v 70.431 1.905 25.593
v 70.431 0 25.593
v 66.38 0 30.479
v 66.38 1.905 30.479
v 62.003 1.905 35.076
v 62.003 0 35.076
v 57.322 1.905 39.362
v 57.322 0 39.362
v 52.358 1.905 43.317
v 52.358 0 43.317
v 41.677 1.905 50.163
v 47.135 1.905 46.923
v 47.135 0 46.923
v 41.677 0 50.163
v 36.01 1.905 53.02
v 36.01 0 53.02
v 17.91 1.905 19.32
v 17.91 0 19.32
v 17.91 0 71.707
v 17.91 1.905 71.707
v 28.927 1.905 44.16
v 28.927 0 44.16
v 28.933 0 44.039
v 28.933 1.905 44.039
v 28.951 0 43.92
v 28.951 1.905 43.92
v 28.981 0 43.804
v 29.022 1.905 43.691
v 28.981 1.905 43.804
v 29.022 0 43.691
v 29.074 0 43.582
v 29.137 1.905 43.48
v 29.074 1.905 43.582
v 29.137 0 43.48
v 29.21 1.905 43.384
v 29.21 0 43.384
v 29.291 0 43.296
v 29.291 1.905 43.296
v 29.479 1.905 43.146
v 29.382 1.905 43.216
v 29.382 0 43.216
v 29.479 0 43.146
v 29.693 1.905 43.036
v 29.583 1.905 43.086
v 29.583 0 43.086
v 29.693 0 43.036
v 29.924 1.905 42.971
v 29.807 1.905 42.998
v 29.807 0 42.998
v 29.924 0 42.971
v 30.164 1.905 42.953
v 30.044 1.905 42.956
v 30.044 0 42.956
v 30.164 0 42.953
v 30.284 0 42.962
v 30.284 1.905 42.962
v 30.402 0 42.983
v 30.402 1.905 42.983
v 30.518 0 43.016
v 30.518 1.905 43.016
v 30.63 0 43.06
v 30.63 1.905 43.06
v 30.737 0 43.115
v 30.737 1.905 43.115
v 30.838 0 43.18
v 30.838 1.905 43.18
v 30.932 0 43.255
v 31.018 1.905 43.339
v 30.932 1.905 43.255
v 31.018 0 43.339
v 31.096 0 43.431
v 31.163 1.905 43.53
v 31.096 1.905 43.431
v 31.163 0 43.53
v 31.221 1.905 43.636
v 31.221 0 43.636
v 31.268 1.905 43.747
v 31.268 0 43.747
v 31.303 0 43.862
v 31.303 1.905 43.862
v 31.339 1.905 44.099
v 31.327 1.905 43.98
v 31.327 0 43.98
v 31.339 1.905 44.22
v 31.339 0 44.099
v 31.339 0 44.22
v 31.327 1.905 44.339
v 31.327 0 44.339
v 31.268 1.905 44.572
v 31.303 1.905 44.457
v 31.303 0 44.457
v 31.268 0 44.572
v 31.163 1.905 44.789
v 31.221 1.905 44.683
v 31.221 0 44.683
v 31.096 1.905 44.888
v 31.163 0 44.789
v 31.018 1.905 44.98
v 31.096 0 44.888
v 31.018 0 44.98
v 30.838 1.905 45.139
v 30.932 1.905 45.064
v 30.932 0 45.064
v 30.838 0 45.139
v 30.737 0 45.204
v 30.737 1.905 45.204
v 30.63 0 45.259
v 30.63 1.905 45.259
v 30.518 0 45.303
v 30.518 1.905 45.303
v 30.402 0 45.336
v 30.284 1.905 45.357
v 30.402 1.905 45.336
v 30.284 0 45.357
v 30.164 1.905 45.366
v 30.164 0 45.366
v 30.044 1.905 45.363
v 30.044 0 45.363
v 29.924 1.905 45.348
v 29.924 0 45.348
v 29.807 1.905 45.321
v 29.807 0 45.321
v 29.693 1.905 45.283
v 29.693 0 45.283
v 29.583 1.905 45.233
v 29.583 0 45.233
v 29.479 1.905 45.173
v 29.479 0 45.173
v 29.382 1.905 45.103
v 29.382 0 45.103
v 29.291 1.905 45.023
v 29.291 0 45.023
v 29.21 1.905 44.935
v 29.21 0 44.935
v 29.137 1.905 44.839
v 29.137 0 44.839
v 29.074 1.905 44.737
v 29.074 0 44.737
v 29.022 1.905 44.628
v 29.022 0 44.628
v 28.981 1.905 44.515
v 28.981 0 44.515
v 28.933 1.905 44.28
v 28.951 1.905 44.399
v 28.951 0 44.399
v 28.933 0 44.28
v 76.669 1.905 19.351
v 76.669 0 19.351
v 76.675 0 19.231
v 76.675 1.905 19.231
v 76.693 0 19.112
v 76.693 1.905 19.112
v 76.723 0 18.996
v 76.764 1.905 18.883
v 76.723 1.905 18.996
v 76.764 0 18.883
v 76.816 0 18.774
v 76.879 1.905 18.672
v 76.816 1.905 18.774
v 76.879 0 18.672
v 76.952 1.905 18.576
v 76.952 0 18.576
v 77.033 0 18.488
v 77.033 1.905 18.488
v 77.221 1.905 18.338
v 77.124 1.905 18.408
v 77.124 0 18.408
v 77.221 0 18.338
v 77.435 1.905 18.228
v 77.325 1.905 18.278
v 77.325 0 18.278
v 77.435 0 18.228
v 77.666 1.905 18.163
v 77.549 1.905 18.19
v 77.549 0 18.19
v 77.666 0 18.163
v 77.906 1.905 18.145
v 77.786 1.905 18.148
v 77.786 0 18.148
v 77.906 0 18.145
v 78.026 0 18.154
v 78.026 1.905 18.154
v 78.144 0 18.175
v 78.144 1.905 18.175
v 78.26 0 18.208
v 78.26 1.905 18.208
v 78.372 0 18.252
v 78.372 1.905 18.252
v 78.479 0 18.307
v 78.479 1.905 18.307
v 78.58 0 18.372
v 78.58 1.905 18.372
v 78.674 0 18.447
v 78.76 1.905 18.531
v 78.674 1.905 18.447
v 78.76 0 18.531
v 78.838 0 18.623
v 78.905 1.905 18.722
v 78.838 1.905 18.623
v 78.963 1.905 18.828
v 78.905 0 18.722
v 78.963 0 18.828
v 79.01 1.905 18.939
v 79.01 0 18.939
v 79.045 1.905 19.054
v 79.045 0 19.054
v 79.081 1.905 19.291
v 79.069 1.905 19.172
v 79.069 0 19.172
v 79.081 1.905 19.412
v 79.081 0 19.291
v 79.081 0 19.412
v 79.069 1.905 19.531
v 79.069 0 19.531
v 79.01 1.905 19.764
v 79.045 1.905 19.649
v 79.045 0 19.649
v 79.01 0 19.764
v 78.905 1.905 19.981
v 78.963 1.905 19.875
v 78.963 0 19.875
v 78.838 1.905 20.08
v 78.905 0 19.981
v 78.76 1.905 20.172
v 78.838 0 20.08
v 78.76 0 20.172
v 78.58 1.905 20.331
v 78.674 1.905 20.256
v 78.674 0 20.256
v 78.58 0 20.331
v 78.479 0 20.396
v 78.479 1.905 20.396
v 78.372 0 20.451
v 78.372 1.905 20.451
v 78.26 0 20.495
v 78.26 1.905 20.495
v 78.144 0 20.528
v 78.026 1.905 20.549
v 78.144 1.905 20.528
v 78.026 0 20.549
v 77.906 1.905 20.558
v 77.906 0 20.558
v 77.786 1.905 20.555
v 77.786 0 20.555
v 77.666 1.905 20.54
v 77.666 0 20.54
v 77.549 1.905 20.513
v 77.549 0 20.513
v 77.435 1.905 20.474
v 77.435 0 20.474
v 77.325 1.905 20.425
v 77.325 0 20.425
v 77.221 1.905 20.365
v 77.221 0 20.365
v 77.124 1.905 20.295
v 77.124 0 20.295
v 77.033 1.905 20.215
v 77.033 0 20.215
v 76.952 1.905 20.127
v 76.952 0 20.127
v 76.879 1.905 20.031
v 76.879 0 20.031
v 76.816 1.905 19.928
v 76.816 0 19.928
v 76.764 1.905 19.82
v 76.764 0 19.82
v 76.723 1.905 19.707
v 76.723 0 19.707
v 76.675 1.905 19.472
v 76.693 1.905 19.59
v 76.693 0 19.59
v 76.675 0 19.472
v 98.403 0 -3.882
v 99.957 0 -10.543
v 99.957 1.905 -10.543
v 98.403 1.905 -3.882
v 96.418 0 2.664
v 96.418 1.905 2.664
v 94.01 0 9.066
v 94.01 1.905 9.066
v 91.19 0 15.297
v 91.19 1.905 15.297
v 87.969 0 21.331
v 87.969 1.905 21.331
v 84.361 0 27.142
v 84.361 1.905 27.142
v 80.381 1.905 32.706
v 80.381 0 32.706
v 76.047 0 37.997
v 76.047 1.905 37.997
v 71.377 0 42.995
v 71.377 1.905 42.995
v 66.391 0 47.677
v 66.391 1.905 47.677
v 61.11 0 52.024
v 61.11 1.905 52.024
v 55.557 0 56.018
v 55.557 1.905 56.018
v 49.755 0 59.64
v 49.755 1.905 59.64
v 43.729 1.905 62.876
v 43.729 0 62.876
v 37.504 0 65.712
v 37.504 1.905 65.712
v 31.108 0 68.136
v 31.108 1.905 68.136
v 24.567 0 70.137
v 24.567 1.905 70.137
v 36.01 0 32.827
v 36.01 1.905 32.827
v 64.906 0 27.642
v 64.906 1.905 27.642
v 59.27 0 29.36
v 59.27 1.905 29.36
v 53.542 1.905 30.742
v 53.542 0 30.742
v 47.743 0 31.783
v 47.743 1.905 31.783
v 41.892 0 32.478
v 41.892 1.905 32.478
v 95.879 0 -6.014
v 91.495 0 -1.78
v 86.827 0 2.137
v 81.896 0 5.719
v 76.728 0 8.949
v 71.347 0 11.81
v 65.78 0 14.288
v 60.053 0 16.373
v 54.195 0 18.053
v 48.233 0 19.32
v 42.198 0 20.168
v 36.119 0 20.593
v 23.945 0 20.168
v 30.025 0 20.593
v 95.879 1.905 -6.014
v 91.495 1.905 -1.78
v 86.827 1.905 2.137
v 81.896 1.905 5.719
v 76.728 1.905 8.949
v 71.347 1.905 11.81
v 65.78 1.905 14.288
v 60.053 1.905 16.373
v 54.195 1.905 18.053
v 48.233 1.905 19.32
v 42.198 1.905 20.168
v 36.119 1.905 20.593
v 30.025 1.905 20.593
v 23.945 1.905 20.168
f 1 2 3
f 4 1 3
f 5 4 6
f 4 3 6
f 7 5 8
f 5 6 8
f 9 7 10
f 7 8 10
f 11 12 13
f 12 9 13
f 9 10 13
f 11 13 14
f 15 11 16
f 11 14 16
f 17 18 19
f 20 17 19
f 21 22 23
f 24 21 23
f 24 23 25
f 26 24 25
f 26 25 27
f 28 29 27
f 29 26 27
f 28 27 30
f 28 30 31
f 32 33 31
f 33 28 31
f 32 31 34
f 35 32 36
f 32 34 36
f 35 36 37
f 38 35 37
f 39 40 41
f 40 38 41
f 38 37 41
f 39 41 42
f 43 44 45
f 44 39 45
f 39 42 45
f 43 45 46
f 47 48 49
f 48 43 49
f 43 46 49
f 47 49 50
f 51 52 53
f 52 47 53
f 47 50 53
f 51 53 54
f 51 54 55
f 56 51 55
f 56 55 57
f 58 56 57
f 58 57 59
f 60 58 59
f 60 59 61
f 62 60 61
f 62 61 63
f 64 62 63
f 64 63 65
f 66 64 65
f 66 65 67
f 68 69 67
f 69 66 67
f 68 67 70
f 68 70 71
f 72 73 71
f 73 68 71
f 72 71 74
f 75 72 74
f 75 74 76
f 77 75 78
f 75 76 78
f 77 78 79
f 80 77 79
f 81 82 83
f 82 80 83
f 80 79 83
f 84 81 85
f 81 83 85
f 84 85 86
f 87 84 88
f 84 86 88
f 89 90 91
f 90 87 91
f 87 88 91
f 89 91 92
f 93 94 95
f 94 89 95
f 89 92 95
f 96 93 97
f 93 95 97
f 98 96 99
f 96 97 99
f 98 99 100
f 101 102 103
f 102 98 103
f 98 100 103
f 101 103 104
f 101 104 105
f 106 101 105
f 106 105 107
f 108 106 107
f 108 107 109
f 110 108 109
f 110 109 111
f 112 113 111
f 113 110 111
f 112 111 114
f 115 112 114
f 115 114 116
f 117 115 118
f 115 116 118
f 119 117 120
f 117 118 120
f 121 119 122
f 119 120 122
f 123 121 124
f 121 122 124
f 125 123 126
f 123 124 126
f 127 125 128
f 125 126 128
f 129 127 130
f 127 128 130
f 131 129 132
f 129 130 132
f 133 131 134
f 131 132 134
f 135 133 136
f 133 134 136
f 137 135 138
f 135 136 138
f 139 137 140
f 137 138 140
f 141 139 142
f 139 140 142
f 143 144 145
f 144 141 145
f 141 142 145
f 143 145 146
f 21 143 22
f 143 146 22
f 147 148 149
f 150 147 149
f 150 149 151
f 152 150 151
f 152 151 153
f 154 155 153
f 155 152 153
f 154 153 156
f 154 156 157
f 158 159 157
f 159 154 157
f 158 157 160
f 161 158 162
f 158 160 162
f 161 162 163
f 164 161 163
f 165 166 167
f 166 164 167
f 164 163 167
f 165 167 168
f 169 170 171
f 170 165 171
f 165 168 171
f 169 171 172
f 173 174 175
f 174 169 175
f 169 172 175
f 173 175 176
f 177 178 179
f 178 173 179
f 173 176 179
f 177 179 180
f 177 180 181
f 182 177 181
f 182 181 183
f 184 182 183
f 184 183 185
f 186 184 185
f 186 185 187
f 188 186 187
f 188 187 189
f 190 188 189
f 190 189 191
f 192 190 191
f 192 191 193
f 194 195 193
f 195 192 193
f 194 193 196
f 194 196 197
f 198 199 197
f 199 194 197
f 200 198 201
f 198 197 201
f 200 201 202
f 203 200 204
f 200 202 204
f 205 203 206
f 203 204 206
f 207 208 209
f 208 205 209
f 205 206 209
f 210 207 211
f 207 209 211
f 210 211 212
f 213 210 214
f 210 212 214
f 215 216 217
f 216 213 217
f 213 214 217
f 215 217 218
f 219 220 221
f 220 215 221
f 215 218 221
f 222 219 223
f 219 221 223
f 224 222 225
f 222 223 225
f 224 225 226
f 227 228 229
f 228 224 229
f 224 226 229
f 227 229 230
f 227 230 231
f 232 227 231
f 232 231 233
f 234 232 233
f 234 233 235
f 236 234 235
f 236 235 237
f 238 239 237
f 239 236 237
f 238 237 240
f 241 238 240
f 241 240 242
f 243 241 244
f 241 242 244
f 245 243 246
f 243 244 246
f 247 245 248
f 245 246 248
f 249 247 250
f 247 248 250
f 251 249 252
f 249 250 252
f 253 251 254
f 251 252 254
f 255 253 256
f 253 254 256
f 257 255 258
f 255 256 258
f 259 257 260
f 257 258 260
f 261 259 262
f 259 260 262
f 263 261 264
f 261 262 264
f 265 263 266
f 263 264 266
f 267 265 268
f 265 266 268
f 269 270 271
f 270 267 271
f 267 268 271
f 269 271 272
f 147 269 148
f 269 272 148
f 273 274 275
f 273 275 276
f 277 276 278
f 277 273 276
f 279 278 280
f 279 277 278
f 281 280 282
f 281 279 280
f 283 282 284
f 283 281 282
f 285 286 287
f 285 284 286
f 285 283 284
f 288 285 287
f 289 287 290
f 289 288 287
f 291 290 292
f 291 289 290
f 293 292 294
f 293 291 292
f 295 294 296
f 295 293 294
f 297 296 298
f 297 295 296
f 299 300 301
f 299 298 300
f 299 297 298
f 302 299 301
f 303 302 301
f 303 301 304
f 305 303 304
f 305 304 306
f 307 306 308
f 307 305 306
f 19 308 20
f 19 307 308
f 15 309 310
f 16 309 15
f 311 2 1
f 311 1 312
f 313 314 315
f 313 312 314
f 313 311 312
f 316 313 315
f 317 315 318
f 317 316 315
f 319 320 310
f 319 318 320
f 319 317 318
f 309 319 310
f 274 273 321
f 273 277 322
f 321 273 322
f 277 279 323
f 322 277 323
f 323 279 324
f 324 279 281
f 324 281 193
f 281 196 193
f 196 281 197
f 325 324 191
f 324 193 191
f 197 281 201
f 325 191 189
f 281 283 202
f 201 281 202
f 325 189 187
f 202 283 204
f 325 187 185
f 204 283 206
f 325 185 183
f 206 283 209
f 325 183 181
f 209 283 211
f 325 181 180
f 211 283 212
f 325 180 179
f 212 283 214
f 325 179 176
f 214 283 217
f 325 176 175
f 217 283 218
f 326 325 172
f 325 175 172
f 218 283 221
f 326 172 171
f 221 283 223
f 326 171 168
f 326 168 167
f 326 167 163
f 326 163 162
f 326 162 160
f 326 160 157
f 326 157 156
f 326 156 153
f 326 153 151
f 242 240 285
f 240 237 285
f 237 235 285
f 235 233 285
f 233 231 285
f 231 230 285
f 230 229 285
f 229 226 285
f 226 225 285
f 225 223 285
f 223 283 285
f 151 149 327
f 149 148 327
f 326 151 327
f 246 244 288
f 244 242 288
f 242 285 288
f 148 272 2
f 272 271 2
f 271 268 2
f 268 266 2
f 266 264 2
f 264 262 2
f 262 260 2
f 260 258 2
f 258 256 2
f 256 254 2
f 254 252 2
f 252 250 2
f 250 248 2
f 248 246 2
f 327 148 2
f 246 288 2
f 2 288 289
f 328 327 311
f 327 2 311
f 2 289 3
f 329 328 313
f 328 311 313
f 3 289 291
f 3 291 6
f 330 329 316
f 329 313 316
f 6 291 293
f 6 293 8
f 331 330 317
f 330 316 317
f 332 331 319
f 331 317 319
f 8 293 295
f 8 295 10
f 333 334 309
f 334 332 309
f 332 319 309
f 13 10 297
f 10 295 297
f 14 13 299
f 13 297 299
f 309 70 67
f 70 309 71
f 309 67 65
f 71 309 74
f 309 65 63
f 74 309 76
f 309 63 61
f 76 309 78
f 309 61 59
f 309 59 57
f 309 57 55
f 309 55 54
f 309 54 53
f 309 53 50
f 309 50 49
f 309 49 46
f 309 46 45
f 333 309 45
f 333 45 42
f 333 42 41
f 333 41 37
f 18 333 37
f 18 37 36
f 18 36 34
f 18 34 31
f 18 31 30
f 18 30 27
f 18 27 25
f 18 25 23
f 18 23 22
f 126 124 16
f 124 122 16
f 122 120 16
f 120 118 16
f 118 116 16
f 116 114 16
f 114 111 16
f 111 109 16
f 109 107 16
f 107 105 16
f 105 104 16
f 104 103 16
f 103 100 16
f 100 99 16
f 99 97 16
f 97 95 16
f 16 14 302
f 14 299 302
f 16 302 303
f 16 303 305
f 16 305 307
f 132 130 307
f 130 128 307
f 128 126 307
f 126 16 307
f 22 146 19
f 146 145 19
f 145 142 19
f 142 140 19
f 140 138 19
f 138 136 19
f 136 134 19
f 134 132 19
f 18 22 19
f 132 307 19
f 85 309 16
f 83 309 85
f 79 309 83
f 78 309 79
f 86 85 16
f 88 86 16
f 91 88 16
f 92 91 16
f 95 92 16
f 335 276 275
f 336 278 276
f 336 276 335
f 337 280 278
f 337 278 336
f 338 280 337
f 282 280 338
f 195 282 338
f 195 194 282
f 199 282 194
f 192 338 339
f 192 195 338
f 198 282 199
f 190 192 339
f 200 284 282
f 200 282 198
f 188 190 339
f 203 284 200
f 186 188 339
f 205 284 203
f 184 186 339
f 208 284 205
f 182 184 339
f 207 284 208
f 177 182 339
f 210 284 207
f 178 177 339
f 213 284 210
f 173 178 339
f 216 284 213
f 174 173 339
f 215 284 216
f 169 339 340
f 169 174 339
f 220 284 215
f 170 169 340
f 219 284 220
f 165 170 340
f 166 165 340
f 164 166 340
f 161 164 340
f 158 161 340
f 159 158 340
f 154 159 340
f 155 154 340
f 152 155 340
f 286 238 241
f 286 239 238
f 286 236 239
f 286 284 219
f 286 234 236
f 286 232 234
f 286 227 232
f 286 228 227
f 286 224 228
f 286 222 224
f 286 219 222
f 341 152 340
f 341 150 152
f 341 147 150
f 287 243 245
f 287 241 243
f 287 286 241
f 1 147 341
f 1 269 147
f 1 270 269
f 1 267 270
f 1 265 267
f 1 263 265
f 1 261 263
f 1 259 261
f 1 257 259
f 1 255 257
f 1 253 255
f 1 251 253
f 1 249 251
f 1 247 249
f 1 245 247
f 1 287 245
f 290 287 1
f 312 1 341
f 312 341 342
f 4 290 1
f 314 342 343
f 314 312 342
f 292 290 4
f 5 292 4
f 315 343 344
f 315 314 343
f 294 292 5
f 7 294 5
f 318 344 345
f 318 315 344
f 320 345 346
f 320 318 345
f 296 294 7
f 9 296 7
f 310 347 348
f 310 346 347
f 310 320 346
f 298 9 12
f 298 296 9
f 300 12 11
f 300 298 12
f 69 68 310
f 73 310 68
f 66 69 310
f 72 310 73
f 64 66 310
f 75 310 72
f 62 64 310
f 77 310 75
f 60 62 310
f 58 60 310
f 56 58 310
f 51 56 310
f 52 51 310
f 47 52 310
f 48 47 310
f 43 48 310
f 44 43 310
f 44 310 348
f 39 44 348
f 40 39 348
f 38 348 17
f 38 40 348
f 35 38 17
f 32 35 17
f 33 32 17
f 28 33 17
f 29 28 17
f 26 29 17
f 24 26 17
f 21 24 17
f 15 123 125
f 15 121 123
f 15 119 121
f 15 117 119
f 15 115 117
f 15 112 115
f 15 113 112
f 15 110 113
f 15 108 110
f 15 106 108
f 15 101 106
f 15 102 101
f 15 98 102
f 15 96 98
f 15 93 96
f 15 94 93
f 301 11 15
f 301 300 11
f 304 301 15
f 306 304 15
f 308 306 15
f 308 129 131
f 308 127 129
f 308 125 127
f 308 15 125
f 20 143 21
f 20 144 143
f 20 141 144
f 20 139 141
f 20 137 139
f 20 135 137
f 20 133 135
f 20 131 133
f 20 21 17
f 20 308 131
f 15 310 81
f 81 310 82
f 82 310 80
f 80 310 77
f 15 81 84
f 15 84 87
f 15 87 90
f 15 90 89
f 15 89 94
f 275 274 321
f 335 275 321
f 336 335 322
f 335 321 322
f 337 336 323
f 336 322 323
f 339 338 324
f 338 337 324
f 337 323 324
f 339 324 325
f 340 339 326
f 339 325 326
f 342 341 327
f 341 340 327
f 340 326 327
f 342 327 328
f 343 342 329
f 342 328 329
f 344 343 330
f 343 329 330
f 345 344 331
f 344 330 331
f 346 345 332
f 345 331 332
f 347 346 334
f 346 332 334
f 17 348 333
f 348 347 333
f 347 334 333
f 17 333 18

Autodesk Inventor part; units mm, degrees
ref_plane "YZ Plane" through (0, 0, 0) normal (1, 0, 0) x (0, 1, 0)
ref_plane "XZ Plane" through (0, 0, 0) normal (0, 1, 0) x (-1, 0, 0)
ref_plane "XY Plane" through (0, 0, 0) normal (0, 0, 1) x (1, 0, 0)
sketch "Sketch12" plane through (0, 0, 0) normal (0, 1, 0) x (-1, 0, 0)
  arc A0 (-17.9101, 19.3197) -> (-99.957, -10.5429) centre (-33.0718, -66.6663) ccw
  arc A1 (-36.0097, 32.8266) -> (-70.4306, 25.593) centre (-33.0718, -66.6663) ccw
  circle A2 centre (-30.1338, 44.1595) radius 1.016
  line L0 (-36.0097, 32.8266) -> (-36.0097, 53.0201)
  arc A3 (-36.0097, 53.0201) -> (-70.4306, 25.593) centre (2.8014, -31.0003) ccw
  line L1 (-17.9101, 19.3197) -> (-17.9101, 71.7072)
  arc A4 (-17.9101, 71.7072) -> (-99.957, -10.5429) centre (2.8014, -31.0003) ccw
  circle A5 centre (-30.1338, 44.1595) radius 1.2065
  circle A6 centre (-77.8759, 19.3514) radius 1.2065
extrude "Extrusion13" add sketch "Sketch12" along normal blind 1.905 contours A0 A4 L1
properties part number "landing-gear-claws" material "ABS Plastic"
